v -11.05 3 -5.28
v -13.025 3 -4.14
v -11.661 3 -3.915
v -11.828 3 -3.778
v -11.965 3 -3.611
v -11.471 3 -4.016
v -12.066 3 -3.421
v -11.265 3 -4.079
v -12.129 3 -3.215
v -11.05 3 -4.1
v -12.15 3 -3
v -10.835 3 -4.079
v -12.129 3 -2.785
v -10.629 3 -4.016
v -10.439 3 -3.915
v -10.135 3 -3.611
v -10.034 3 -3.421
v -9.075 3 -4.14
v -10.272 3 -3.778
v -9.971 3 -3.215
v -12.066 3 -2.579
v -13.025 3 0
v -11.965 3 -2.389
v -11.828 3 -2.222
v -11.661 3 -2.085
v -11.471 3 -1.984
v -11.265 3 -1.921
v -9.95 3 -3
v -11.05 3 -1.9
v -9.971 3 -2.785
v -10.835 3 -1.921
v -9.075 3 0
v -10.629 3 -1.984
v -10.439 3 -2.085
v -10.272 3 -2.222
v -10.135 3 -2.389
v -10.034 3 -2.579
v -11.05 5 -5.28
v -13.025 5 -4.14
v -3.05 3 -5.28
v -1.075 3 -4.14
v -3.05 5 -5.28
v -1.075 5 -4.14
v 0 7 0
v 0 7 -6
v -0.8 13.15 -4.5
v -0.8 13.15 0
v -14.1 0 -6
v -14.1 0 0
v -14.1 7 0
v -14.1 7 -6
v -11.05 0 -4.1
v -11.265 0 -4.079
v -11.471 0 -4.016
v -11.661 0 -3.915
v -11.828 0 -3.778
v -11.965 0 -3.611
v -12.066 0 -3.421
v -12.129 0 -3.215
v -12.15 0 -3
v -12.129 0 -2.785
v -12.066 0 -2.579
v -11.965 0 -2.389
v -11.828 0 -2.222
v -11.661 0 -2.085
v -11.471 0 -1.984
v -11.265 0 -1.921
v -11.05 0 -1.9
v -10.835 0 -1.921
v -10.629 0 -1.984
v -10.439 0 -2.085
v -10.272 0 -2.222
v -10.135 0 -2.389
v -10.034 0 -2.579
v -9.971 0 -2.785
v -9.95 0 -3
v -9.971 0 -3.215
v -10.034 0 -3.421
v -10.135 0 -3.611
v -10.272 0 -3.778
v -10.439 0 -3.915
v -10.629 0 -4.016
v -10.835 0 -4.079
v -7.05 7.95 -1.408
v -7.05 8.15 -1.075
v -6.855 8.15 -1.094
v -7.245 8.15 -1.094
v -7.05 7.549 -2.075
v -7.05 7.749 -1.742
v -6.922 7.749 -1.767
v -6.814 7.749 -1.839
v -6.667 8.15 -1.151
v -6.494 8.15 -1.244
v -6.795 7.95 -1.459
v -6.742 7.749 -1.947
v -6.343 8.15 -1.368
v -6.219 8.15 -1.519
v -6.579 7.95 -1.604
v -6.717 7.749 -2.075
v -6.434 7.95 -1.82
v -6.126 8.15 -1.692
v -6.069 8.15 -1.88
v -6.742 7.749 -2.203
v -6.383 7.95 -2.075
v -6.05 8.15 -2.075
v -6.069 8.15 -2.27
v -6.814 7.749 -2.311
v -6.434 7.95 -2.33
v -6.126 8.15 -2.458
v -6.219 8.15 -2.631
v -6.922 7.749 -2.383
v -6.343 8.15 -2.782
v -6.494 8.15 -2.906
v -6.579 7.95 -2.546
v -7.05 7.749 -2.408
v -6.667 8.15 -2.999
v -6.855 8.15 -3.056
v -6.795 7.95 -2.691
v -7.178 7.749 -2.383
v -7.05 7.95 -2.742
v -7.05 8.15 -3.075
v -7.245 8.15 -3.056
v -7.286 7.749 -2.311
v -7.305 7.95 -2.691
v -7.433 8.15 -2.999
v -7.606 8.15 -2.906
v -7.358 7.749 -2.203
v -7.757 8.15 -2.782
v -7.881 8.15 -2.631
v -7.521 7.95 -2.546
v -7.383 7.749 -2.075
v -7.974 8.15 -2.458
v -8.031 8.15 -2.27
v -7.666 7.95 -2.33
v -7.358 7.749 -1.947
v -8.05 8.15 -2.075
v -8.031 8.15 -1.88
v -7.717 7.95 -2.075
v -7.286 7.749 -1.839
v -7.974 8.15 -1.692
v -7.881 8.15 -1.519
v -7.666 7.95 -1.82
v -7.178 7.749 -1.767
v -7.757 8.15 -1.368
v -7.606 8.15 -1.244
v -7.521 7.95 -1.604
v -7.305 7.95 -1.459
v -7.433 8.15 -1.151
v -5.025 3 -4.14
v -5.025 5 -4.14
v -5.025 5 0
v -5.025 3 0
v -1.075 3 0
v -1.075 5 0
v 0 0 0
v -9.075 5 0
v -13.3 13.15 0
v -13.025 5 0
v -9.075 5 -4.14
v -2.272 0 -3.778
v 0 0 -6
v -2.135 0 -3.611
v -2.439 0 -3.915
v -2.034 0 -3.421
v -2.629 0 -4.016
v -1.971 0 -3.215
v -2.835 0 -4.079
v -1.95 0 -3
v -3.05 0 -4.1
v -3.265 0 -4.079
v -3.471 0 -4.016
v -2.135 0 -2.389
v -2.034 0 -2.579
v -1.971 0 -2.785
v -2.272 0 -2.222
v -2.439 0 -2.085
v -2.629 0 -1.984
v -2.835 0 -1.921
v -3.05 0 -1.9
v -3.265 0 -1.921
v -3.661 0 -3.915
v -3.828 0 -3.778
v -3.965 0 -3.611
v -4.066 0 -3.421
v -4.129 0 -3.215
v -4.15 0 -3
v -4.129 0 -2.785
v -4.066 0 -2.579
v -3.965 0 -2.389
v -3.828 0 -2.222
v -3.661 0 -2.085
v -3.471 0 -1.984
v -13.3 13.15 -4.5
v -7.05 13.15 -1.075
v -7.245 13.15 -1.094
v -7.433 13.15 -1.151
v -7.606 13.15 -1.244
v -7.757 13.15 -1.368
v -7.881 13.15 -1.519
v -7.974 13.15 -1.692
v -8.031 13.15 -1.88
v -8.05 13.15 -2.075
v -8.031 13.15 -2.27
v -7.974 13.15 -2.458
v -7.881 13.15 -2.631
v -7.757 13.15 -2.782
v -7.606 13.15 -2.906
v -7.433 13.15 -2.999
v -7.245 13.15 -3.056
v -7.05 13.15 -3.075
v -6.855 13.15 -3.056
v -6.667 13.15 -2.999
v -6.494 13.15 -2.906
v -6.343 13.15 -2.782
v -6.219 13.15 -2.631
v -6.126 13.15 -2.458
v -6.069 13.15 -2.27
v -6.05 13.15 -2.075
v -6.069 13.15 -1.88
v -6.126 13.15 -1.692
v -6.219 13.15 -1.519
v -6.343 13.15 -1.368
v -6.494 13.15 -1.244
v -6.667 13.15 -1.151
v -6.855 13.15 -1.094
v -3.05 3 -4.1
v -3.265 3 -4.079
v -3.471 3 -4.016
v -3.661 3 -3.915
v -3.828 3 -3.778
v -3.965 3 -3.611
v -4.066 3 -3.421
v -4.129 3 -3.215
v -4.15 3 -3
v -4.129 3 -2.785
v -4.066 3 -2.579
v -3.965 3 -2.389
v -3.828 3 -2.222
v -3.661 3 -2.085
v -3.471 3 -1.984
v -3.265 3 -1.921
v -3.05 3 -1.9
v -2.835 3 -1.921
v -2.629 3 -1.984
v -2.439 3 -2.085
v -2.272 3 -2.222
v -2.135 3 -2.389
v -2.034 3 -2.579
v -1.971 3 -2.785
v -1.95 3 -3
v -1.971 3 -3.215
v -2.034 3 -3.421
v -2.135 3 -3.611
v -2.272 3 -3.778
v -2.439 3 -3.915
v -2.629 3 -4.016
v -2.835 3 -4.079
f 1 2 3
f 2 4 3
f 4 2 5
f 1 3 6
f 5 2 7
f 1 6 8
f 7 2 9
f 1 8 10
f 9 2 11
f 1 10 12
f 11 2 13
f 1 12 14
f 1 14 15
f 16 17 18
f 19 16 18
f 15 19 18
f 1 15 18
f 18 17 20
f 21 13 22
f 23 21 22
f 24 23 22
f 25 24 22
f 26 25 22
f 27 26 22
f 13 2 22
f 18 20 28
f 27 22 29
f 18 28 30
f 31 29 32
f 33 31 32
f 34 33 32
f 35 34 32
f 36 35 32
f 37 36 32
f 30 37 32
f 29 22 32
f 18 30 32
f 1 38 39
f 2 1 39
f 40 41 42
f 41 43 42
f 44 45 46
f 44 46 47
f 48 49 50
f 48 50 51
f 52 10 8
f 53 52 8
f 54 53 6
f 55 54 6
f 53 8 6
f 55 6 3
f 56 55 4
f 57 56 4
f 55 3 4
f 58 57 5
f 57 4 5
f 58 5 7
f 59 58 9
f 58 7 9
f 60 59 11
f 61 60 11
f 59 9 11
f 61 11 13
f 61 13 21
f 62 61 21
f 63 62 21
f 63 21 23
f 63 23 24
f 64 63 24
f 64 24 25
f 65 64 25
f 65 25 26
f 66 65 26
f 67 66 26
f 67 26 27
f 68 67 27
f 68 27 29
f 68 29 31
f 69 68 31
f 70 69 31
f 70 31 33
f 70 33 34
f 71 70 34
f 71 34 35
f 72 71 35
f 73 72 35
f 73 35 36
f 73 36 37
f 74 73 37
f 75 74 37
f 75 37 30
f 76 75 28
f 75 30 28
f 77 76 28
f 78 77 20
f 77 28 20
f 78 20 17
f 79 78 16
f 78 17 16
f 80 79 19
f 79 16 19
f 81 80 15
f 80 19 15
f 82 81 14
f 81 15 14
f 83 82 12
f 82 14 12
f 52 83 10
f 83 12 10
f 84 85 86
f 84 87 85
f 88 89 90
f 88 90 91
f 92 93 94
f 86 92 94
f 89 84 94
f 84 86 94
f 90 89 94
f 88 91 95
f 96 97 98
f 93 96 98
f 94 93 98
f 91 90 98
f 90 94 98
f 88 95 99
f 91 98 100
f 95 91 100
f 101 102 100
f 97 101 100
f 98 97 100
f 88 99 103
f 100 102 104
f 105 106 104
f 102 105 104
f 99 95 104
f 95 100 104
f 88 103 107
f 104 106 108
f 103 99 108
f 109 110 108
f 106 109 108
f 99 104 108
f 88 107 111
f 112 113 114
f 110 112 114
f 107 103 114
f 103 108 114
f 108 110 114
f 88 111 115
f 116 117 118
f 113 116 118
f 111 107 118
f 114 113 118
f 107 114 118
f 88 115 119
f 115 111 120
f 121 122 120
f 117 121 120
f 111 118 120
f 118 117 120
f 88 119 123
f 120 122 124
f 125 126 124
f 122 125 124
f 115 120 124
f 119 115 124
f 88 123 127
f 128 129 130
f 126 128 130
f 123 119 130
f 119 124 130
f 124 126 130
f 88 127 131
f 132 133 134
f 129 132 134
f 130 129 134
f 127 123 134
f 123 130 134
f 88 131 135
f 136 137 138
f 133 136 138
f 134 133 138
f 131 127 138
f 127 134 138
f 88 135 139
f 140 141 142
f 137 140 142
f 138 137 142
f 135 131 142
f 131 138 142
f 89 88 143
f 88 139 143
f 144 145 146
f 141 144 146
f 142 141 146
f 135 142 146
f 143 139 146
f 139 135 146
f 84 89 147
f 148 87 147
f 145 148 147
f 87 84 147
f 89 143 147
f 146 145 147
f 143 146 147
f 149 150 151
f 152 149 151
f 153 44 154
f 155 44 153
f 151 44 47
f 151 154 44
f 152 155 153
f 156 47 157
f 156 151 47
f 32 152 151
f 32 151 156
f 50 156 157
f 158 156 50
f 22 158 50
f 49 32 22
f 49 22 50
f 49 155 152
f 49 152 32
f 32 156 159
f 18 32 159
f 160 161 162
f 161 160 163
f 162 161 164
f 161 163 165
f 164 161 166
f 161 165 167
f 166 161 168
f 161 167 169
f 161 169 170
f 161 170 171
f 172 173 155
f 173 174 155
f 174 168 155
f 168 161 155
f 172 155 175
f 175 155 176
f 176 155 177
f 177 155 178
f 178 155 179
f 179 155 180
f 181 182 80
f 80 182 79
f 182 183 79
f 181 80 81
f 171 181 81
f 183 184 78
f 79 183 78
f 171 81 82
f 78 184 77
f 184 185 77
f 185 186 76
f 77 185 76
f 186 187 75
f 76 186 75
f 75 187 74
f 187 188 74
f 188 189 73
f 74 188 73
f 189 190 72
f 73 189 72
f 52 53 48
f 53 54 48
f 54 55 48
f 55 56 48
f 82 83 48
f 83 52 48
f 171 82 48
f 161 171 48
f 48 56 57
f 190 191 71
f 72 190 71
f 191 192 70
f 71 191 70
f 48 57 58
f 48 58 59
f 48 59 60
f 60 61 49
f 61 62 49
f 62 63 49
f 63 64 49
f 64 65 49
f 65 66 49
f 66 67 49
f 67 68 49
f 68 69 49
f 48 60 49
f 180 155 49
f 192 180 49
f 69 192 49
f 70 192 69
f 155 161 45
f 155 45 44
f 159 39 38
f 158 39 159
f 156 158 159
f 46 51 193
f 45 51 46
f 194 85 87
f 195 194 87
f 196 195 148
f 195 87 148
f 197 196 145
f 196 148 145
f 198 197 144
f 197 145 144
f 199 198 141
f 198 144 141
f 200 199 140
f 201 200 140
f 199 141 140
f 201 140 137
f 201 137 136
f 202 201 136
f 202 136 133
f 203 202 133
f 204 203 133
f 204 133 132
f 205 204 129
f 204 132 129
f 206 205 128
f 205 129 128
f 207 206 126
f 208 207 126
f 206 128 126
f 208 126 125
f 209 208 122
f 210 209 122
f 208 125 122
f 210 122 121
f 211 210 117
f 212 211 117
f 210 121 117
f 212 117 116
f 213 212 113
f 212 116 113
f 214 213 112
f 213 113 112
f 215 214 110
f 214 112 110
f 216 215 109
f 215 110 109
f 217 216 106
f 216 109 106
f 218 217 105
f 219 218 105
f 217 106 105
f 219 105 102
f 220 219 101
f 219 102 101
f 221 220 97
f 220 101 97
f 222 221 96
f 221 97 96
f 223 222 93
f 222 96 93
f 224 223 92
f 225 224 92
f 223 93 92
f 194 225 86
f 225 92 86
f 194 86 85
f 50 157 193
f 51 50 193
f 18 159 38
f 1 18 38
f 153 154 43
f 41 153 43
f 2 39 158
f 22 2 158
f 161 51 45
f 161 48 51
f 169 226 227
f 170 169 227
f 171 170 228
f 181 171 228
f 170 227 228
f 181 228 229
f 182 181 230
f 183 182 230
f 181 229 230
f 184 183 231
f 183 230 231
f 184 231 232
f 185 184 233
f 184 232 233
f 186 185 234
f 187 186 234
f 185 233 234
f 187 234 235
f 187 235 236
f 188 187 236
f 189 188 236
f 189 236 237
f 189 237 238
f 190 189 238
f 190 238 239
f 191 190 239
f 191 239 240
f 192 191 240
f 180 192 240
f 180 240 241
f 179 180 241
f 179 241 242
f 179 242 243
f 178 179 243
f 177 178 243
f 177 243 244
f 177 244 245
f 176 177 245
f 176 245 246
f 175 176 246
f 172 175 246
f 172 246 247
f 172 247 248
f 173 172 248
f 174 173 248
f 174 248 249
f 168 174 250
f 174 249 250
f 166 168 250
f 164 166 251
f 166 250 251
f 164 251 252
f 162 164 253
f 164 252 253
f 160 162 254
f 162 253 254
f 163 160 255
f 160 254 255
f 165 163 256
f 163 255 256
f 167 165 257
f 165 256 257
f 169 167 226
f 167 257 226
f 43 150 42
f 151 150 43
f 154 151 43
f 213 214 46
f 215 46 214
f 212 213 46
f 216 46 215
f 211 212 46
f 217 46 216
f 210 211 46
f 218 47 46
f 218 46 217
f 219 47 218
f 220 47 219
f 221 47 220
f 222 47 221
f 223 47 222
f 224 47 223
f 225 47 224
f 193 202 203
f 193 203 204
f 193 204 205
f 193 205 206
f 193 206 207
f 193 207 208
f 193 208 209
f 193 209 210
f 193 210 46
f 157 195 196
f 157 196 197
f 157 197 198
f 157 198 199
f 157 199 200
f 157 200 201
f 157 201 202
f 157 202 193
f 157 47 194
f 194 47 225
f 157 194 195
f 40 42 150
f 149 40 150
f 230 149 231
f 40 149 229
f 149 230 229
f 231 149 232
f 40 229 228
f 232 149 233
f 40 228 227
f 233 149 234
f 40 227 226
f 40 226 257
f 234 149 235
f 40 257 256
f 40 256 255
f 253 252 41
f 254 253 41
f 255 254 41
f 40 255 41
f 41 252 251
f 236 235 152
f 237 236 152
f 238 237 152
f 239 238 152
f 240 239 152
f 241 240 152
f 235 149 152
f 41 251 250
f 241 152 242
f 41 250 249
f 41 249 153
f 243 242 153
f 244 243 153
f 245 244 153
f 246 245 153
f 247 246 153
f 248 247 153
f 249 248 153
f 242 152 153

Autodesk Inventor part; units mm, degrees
ref_plane "YZ Plane" through (0, 0, 0) normal (1, 0, 0) x (0, 1, 0)
ref_plane "XZ Plane" through (0, 0, 0) normal (0, 1, 0) x (-1, 0, 0)
ref_plane "XY Plane" through (0, 0, 0) normal (0, 0, 1) x (1, 0, 0)
sketch "Эскиз1" plane through (0, 0, 0) normal (0, 1, 0) x (-1, 0, 0)
  line L0 (0, 0) -> (14.1, 0)
  line L1 (14.1, 0) -> (14.1, -6)
  line L2 (14.1, -6) -> (0, -6)
  line L3 (0, -6) -> (0, 0)
  dimension "d0" = 14.1
  dimension "d1" = 6
extrude "Выдавливание1" add sketch "Эскиз1" along normal blind 13.15
sketch "Эскиз2" plane through (0, 13.15, 0) normal (0, 1, 0) x (1, 0, 0)
  line L0 (-14.1, 0) -> (0, 0) projected
  line L1 (-7.05, 0) -> (-7.05, 2.075)
  dimension "d4" = 2.075
hole "Отверстие1" at (-7.05, 13.15, -2.075) direction (0, -1, 0) diameter 2 depth 5 tip angle 118
sketch "Эскиз3" plane through (0, 0, 0) normal (0, -1, 0) x (1, 0, 0)
  line L0 (0, 0) -> (0, -6) projected
  line L1 (0, -3) -> (-3.05, -3)
  line L2 (-14.1, -6) -> (-14.1, 0) projected
  line L3 (-14.1, -3) -> (-11.05, -3)
  line L4 (0, 0) -> (0, -6) projected
  line L5 (-14.1, -6) -> (-14.1, 0) projected
  line L6 (-14.1, 0) -> (0, 0) projected
  dimension "d12" = 3
  dimension "d24" = 8
hole "Отверстие2" at (-3.05, 0, -3) at (-11.05, 0, -3) direction (0, 1, 0) diameter 2.2 depth 5
sketch "Эскиз4" plane through (0, 0, 0) normal (0, -1, 0) x (1, 0, 0)
  circle A0 centre (-3.05, -3) radius 1.1 projected
  circle A1 centre (-11.05, -3) radius 1.1 projected
  line L0 (-3.05, -5.2805) -> (-5.025, -4.1403)
  line L1 (-5.025, -4.1403) -> (-5.025, -1.8597)
  line L2 (-5.025, -1.8597) -> (-3.05, -0.7195)
  line L3 (-3.05, -0.7195) -> (-1.075, -1.8597)
  line L4 (-1.075, -1.8597) -> (-1.075, -4.1403)
  line L5 (-1.075, -4.1403) -> (-3.05, -5.2805)
  line L6 (0, 0) -> (0, -6) projected
  line L7 (-11.05, -5.2805) -> (-13.025, -4.1403)
  line L8 (-13.025, -4.1403) -> (-13.025, -1.8597)
  line L9 (-13.025, -1.8597) -> (-11.05, -0.7195)
  line L10 (-11.05, -0.7195) -> (-9.075, -1.8597)
  line L11 (-9.075, -1.8597) -> (-9.075, -4.1403)
  line L12 (-9.075, -4.1403) -> (-11.05, -5.2805)
  line L13 (-1.075, -1.8597) -> (-5.025, -1.8597)
  line L14 (-5.025, -1.8597) -> (-5.025, 0)
  line L15 (-5.025, 0) -> (-1.075, 0)
  line L16 (-1.075, 0) -> (-1.075, -1.8597)
  line L17 (-14.1, 0) -> (0, 0) projected
  line L18 (-9.075, -1.8597) -> (-13.025, -1.8597)
  line L19 (-13.025, -1.8597) -> (-13.025, 0)
  line L20 (-13.025, 0) -> (-9.075, 0)
  line L21 (-9.075, 0) -> (-9.075, -1.8597)
  point P0 (-3.05, 0)
  point P1 (-9.075, 0)
  dimension "d21" = 3.95
extrude "Выдавливание2" cut sketch "Эскиз4" along normal blind 2 from surface at -5 contours A0 | A1 | L21 L10 L9 L19 L17 | L0 L1 L13 L4 L5 | L14 L15 L16 L3 L2 | L2 L3 L13 | L18 L9 L10 | L11 L12 L7 L8 L18
chamfer "Фаска1" distance 0.8 distance2 6.15 1 edges at (-14.1, 13.15, -3) measured on face at (-7.05, 13.15, -5.025)
chamfer "Фаска2" distance 0.8 distance2 6.15 1 edges at (0, 13.15, -3) measured on face at (-6.7833, 13.15, -5.025)
chamfer "Фаска3" distance 1.5 distance2 6.15 1 edges at (-7.05, 13.15, -6) measured on face at (-7.05, 13.15, -5.025)
equation "\"Радиус_гибки\" = Толщина"
equation "\"Ширина_просечки\" = Толщина"
equation "\"Глубина_просечки\" = 0.5 * Толщина"
equation "\"Размер_просечки\" = 4 * Толщина"
equation "\"Мин_остаток\" = 2 * Толщина"
equation "\"Радиус_перехода\" = Радиус_гибки"
equation "\"Радиус_Якоби\" = Толщина"
equation "\"Размер_зазора\" = Толщина"
equation "\"Толщина\" = 0.5"
properties part number "Съемная стойка сервы"
